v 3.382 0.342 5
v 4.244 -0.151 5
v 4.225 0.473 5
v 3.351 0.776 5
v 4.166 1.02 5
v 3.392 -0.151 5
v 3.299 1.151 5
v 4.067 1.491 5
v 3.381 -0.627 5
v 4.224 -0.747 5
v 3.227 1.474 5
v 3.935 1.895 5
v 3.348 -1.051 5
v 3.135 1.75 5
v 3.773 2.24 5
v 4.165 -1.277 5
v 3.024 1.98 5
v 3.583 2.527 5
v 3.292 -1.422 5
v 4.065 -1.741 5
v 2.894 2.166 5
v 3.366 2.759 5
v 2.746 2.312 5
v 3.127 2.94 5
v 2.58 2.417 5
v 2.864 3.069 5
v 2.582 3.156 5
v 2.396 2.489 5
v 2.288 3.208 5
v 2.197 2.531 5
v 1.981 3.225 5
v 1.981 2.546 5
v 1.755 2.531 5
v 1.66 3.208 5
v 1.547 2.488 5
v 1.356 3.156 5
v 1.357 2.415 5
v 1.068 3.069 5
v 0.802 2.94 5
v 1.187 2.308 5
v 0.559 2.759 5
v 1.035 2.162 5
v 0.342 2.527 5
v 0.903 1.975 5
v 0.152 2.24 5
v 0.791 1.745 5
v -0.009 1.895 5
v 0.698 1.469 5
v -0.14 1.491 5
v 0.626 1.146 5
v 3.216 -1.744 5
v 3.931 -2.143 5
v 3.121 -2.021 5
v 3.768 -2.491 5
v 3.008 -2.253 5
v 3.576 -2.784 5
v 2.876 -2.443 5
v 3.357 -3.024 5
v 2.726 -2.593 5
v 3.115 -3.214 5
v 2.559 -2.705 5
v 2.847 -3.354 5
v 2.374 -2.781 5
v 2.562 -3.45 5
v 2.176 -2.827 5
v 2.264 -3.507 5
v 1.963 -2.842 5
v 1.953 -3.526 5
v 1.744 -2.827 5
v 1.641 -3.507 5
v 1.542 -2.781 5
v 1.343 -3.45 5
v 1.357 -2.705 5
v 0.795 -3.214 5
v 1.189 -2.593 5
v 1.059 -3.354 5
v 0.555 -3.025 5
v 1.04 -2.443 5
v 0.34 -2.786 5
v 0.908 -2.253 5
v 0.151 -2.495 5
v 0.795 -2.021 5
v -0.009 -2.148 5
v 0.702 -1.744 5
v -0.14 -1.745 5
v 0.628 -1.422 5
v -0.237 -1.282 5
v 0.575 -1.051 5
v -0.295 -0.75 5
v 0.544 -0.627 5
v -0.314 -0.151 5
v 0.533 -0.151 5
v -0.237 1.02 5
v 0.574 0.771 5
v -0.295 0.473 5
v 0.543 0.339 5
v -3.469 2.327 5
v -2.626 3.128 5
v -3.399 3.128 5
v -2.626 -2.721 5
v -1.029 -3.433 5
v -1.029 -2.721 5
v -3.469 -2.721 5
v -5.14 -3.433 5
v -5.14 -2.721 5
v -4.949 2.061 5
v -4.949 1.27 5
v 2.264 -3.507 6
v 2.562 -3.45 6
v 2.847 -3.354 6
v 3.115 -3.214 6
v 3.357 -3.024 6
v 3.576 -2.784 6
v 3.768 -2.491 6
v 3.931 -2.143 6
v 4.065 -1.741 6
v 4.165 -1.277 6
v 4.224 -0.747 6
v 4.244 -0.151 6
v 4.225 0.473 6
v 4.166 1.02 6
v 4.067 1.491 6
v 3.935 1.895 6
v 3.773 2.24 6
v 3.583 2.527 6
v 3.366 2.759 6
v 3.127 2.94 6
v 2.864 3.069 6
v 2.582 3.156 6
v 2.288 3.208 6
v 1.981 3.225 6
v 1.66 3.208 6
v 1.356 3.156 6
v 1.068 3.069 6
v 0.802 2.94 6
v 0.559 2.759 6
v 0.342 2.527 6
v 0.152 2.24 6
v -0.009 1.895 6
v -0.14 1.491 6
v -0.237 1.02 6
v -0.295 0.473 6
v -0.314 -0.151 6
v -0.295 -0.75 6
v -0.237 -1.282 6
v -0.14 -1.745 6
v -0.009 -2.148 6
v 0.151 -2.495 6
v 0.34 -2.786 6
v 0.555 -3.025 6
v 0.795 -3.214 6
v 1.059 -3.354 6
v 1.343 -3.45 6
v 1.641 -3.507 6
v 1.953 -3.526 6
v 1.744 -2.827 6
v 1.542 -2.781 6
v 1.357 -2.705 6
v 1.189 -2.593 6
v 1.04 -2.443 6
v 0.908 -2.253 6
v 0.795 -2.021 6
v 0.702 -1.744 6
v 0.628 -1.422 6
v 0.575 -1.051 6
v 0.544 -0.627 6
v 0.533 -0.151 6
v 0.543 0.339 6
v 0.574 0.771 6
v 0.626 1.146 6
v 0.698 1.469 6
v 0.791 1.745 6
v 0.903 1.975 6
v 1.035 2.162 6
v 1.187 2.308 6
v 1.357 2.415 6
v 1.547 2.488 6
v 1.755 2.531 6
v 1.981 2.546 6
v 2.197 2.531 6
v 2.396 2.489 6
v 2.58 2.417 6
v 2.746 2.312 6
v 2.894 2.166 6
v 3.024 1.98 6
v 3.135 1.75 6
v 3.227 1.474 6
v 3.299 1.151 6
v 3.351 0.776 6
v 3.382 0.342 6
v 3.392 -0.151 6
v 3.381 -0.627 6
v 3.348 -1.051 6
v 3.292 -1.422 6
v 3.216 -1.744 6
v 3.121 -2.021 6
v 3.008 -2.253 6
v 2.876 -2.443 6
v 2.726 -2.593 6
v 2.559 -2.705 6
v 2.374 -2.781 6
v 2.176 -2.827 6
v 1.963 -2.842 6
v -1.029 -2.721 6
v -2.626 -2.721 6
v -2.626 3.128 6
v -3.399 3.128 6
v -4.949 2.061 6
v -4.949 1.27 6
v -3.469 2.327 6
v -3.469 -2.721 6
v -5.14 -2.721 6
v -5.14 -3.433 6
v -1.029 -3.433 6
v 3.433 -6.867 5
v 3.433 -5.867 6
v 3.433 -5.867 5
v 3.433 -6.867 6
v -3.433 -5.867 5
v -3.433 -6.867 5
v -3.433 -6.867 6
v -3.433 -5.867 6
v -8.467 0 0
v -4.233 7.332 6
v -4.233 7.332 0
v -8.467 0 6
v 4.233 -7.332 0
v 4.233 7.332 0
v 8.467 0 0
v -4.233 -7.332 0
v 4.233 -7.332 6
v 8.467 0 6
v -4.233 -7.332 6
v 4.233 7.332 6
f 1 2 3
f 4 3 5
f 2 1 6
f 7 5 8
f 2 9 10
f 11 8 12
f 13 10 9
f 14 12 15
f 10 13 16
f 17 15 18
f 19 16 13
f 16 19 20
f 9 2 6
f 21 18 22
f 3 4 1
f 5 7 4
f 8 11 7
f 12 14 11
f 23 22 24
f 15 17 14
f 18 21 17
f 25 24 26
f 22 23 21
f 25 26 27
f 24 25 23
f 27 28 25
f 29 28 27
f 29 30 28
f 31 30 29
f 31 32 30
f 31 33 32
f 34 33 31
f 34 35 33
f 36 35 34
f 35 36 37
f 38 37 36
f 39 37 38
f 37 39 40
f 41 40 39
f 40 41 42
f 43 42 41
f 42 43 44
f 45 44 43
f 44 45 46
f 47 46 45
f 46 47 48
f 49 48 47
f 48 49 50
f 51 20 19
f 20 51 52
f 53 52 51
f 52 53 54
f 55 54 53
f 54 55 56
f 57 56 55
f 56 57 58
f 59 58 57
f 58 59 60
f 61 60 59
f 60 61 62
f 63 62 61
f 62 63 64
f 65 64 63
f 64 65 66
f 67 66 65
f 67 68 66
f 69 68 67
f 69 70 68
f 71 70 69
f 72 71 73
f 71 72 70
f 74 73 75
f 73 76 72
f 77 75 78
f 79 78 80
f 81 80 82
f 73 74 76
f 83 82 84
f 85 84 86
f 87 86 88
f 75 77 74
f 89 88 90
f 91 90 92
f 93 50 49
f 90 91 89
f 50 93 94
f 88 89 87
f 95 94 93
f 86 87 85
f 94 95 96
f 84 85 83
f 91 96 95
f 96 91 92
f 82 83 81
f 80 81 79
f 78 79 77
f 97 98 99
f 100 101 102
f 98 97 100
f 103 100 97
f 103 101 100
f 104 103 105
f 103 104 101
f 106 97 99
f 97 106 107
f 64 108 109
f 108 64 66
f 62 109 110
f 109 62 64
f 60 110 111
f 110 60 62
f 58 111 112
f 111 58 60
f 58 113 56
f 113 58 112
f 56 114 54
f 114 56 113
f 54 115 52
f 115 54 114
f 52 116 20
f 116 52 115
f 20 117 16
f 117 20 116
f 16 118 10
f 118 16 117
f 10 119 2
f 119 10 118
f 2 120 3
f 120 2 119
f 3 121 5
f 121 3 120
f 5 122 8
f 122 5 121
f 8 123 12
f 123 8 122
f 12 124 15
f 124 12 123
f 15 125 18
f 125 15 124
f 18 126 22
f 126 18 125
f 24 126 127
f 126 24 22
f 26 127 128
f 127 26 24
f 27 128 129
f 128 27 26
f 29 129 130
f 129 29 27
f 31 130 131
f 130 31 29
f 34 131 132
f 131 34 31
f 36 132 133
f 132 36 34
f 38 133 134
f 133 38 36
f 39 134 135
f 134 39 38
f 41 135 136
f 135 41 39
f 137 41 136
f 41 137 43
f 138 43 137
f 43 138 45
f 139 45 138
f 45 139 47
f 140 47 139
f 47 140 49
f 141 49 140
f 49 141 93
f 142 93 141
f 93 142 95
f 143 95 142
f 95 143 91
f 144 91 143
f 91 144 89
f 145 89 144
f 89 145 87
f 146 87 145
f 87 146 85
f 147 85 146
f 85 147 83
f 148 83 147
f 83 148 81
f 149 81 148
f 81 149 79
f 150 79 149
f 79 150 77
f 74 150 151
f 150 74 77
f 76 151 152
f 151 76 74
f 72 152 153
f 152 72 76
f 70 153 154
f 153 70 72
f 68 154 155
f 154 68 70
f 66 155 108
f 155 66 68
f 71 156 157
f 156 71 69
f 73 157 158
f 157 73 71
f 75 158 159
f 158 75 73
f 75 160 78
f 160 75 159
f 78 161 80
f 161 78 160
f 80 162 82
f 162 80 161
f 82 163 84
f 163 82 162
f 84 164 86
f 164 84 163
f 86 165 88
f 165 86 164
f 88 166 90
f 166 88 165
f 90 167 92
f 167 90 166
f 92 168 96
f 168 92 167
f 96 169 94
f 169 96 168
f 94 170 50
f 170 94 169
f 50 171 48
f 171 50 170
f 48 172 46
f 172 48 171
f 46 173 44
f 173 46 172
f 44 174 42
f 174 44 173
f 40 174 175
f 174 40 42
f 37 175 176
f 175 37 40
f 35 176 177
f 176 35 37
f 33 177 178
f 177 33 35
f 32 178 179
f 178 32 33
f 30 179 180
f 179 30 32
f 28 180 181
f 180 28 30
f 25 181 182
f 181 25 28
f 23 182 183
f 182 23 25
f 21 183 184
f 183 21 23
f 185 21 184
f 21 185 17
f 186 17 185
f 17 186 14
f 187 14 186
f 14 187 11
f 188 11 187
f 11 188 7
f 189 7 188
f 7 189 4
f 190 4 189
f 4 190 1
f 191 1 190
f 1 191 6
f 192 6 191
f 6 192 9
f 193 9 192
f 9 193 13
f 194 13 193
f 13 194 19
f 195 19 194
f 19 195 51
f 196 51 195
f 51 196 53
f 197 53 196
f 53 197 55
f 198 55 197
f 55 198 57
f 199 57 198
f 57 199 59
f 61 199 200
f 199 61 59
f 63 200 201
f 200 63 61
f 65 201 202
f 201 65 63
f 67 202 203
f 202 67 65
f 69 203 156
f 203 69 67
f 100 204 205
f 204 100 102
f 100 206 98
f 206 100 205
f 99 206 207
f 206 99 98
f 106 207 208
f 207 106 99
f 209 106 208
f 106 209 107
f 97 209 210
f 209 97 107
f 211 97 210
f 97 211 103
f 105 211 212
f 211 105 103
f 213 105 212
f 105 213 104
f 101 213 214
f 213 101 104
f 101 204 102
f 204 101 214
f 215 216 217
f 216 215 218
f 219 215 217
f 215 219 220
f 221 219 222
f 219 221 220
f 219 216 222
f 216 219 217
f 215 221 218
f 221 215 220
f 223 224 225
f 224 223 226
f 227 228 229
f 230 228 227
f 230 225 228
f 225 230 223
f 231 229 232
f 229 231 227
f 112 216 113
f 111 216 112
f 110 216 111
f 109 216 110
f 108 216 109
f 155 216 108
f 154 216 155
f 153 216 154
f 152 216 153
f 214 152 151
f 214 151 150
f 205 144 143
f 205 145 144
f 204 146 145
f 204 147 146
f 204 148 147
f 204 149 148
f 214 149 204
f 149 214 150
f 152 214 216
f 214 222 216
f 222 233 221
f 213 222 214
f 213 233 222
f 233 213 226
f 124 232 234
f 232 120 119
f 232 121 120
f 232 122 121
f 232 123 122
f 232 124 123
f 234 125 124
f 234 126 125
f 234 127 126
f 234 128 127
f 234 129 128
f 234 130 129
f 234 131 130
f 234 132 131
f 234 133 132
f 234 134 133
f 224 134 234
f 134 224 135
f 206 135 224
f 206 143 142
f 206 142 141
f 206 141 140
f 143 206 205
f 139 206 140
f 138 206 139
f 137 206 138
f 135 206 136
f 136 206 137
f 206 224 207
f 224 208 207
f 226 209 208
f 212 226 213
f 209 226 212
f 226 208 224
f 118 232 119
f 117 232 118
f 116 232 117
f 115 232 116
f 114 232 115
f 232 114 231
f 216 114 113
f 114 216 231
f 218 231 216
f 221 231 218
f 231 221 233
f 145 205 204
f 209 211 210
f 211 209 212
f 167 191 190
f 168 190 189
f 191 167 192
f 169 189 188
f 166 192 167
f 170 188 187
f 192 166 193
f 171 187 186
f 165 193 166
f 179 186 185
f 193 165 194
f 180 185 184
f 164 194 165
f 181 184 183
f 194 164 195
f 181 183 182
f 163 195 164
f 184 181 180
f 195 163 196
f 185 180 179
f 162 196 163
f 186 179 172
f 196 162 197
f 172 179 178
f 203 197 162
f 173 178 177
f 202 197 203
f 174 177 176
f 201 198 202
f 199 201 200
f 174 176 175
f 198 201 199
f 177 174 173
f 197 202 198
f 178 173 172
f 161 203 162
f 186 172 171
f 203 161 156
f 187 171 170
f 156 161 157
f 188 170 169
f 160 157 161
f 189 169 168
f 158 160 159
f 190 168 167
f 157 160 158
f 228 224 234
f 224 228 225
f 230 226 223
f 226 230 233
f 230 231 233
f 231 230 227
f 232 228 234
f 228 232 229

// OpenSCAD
// file: ../library/calculate.scad
module inlay(depth)
{
    difference()
    {
        children(0);
        translate([ 0, 0, depth ]) children([1:$children - 1]);
    }
}
// file: ../library/variables.scad
// Variables

die_width = 12;
double_digit_placement = 1; // 0.7 for 8mm, 1 for 12mm

wiggle_width = 0.2;
separator = 1.6;
base_plate_sides = 5;
token_sides = 6;
slot_height = 1;

// Calculations

height = die_width / 2;

die_slot_width = die_width + wiggle_width;
die_slot_y = -1 * ((die_slot_width / 2) + separator);
die_slot_right_x = (die_slot_width / 2) + separator;
die_slot_left_x = -1 * (die_slot_width / 2) - separator;

base_plate_size = (die_slot_width * 2) + separator;
inset_width = base_plate_size - separator;
inset_depth = height - separator;

shallow_slot_height = (height - inset_depth) / 2;

token_slot_width = base_plate_size / 3;
token_width = token_slot_width - wiggle_width;
token_height = height;
token_slot_y = (die_slot_width / 2) + (separator * 2);
token_inset_height = token_height - 1;
token_doubledigit_font_size = token_width - separator;

token_poison_width = (token_width / 3);
token_poison_placement = (token_width / 3);
// file: ../library/tokens.scad
include <variables.scad>
include <calculate.scad>

module token_base()
{
    linear_extrude(token_height) circle(token_width, $fn = token_sides);
}

module token_doubledigit_number(num) 
{
    inlay(depth = token_inset_height) 
    {
        token_base();
        translate([-1 * token_doubledigit_font_size + double_digit_placement, -1 * token_doubledigit_font_size / 2, 0]) linear_extrude(token_height) text(text = num, size = token_doubledigit_font_size);
        translate([-1 * token_doubledigit_font_size / 2, -1 * token_doubledigit_font_size, 0]) cube([token_doubledigit_font_size, 1, 2]);
    }
}

module token_singledigit_number(num) 
{ 
    inlay(depth = token_inset_height) 
    {
        token_base();
        translate([-1 * (token_doubledigit_font_size / 2), -1 * token_doubledigit_font_size / 2, 0]) linear_extrude(token_height) text(text = num, size = token_doubledigit_font_size);
        translate([-1 * token_doubledigit_font_size / 2, -1 * token_doubledigit_font_size, 0]) cube([token_doubledigit_font_size, 1, 2]);
    }
}
// main file
include <../library/tokens.scad>

token_doubledigit_number("10");
